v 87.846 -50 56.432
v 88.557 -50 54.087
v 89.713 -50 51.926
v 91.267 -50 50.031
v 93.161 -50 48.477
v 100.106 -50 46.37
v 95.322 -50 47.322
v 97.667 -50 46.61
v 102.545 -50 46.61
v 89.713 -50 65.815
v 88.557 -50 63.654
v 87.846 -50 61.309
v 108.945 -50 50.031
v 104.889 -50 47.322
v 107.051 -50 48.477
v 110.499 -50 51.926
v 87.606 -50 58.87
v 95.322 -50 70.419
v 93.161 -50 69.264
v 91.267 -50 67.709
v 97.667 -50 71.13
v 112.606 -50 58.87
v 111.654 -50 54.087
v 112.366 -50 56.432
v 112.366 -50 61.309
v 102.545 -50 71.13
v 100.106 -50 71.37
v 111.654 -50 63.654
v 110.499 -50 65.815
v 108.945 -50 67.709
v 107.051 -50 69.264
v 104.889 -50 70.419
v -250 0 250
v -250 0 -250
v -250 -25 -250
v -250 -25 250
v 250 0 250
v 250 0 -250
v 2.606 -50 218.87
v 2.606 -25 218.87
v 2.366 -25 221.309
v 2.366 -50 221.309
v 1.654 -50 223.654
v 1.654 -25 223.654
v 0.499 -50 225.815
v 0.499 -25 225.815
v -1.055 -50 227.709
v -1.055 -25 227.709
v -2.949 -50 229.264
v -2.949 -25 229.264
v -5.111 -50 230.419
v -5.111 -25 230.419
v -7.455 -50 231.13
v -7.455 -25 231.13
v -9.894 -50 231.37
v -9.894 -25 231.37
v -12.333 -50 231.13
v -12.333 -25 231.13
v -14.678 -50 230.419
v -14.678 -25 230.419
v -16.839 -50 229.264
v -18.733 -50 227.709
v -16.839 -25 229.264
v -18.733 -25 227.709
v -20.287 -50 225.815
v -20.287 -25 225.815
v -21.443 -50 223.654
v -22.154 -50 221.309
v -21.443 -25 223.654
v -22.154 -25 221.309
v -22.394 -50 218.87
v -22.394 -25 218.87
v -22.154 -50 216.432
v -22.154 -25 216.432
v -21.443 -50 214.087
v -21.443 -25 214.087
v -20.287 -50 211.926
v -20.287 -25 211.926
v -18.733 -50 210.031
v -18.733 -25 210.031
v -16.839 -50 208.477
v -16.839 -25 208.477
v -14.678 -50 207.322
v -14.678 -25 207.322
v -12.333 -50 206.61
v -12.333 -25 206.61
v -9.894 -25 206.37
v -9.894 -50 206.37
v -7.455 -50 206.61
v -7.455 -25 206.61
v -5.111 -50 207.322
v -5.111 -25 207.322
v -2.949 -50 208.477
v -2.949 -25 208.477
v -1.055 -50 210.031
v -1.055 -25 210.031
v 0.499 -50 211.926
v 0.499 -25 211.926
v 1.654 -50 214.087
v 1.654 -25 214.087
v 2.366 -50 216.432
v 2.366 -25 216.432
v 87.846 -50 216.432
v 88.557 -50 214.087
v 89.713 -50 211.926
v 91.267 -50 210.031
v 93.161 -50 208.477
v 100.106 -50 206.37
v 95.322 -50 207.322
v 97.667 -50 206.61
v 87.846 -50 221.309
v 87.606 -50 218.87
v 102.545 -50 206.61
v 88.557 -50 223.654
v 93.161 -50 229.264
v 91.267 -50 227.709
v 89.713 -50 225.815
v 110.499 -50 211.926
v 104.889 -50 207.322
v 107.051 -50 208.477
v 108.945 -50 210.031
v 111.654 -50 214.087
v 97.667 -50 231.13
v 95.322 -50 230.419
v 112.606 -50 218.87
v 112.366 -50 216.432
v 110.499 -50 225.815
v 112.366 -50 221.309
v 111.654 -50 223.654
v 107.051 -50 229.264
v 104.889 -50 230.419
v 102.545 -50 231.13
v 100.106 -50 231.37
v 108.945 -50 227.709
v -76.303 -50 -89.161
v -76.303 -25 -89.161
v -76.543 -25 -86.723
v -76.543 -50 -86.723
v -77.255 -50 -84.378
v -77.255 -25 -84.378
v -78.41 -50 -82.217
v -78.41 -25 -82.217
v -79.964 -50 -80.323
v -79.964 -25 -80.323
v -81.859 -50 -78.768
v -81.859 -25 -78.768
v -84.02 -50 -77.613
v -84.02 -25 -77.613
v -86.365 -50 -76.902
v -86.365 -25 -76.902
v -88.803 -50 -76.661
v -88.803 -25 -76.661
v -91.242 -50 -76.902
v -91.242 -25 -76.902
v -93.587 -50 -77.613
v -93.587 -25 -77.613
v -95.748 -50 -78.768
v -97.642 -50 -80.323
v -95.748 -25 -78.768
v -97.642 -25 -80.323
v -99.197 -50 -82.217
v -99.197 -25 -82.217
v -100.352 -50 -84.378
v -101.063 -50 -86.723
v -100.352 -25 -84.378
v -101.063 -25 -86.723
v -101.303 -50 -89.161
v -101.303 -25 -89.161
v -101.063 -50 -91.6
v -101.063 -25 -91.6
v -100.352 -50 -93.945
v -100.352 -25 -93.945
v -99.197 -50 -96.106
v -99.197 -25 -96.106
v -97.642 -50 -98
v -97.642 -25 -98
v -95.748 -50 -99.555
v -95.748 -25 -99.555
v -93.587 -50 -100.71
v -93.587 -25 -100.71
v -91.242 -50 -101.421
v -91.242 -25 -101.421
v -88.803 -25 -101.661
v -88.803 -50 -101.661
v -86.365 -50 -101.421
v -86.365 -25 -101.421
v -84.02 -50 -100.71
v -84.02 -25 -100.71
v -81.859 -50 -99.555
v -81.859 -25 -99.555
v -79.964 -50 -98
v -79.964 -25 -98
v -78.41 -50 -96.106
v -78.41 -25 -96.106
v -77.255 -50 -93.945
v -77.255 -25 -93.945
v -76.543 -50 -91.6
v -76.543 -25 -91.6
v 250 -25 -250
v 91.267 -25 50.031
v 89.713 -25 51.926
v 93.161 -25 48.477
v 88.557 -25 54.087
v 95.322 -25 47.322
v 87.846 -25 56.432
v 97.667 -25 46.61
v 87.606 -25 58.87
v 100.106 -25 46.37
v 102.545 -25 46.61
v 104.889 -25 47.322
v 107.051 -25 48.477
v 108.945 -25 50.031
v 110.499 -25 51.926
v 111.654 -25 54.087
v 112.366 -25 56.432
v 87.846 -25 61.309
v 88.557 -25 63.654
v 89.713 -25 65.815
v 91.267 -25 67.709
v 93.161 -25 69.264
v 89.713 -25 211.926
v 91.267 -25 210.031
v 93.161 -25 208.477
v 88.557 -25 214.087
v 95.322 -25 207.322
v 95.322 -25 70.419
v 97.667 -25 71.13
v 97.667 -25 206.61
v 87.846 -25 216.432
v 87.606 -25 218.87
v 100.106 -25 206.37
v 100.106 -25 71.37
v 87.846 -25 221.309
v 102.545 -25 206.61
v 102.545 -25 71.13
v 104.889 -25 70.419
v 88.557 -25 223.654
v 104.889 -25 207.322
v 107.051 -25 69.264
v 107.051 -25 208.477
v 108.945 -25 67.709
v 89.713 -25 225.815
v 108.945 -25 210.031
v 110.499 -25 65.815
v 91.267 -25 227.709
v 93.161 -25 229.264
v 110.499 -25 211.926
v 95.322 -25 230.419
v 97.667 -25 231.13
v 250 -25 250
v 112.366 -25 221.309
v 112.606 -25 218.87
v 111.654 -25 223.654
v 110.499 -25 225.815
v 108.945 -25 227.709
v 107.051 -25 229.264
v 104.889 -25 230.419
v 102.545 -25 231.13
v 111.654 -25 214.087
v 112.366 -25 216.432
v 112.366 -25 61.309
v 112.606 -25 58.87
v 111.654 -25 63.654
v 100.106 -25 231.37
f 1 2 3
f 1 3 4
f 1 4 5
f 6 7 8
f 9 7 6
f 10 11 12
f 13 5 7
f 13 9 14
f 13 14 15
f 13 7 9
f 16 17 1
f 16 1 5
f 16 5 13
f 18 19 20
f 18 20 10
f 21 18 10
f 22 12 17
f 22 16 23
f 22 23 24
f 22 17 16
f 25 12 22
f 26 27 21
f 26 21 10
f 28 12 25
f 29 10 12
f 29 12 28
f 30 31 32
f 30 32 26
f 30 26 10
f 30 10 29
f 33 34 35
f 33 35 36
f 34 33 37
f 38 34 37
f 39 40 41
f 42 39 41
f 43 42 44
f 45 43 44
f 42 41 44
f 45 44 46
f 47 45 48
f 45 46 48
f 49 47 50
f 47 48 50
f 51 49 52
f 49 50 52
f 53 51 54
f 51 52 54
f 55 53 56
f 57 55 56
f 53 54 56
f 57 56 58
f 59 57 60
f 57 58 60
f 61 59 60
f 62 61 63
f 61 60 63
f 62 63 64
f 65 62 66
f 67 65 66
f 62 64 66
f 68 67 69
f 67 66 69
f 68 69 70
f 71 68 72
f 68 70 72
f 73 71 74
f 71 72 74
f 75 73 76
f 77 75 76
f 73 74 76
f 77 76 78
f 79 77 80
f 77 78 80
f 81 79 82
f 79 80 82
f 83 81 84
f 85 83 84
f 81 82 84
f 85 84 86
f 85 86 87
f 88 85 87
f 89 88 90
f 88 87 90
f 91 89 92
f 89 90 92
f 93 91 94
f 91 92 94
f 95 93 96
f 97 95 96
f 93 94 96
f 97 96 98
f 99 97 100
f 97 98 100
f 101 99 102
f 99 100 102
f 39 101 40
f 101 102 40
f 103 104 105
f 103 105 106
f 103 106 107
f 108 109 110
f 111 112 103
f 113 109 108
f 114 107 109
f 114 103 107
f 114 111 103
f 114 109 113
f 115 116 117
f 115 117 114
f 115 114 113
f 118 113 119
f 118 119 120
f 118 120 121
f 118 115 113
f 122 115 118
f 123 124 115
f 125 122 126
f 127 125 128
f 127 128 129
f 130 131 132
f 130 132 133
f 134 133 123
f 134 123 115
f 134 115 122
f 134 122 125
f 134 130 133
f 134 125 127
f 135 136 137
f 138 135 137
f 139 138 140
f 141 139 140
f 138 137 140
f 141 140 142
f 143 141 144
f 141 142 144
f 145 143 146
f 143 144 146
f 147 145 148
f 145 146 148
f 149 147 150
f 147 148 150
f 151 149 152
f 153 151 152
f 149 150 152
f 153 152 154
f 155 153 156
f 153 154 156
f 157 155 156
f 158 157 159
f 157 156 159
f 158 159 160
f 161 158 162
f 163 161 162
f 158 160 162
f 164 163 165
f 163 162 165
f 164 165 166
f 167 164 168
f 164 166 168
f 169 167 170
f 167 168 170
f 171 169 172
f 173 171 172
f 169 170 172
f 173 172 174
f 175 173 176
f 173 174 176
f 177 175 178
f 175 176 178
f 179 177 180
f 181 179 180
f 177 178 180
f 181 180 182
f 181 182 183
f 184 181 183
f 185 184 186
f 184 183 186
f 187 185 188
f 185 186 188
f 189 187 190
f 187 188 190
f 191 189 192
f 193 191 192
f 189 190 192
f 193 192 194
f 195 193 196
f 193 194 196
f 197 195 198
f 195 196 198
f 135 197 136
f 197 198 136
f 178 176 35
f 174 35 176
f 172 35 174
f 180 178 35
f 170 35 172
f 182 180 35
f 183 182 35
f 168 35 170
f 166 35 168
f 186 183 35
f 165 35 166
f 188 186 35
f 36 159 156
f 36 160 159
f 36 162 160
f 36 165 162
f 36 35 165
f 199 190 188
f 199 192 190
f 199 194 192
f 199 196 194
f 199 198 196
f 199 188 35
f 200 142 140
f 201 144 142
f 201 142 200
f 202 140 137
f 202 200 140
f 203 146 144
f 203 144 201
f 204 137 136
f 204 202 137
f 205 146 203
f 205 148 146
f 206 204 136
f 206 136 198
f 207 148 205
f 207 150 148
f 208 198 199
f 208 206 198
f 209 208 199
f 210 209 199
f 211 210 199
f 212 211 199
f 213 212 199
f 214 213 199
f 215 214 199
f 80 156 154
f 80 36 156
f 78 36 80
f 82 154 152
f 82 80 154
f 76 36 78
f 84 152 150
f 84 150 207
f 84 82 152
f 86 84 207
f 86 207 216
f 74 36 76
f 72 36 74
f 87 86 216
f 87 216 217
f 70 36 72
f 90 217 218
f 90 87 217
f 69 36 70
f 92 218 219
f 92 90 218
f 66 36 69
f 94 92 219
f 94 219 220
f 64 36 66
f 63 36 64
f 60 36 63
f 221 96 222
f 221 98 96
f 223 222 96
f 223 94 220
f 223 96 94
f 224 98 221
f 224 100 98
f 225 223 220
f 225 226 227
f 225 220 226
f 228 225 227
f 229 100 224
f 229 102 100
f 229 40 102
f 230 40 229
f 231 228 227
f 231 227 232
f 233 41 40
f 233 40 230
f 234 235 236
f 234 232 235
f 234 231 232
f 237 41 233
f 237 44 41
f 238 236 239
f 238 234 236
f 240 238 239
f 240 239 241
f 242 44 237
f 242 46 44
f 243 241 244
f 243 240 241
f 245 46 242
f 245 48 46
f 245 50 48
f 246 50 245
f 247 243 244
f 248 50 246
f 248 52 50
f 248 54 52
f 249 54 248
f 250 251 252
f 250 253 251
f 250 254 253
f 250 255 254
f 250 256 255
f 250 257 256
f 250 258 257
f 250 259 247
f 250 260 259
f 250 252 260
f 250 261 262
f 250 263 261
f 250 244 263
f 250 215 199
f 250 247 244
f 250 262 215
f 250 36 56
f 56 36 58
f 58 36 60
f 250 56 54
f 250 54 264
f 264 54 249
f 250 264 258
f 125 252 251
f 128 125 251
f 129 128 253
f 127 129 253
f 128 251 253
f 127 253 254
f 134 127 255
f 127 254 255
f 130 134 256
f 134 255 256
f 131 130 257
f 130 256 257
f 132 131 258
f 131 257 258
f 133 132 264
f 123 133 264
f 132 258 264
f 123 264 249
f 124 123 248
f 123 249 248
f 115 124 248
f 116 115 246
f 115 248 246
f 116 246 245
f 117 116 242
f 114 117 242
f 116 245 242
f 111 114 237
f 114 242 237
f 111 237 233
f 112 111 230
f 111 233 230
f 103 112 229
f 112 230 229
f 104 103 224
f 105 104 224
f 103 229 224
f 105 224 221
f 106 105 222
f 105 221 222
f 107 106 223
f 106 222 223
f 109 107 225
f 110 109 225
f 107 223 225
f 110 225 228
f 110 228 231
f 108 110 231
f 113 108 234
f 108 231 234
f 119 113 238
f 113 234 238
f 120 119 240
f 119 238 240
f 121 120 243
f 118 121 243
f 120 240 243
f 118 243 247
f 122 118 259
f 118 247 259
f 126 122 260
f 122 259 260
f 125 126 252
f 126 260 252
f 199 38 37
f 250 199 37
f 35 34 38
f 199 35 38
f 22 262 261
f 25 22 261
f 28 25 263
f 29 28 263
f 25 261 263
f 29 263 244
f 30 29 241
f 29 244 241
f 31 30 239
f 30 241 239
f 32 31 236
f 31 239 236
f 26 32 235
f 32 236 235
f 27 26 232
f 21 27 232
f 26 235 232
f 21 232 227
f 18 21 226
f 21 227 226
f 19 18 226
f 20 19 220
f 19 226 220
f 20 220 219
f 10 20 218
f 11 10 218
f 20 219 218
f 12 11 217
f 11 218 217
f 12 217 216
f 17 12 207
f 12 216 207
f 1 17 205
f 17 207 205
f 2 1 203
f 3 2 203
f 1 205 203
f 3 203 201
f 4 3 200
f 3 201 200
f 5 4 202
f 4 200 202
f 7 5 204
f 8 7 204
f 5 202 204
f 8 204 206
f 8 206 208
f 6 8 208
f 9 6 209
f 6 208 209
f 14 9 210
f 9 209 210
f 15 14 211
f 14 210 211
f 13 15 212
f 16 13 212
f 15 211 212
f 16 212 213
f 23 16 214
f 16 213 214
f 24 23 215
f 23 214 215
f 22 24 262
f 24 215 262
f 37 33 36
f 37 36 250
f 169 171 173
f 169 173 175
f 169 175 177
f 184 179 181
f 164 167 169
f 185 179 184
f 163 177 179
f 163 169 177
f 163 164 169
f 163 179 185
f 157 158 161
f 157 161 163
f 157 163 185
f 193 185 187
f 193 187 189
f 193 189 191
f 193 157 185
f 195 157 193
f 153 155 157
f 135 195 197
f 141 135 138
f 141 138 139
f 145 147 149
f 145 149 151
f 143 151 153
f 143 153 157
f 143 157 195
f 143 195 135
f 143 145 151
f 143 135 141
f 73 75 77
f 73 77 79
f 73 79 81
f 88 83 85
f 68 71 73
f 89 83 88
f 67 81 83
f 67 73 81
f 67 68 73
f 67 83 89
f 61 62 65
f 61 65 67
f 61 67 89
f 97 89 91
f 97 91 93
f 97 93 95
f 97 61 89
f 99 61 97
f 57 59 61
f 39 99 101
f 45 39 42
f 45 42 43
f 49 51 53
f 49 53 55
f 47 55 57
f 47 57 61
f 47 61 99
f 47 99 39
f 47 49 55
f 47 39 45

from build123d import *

# Parameters (mm, degrees)
F0_W     = 500
F0_H     = 500
F1_DEPTH = 25
F2_R     = 12.5
F3_DEPTH = 25


with BuildPart() as f1:
    # F0 (on Front) → F1 (new body)
    with BuildSketch(Plane.XZ):
        Rectangle(F0_W, F0_H)
    extrude(amount=F1_DEPTH)

    # F2 (on face) → F3 (join)
    with BuildSketch(Plane.XZ.offset(25)):
        with Locations((-9.894066, 218.870133)):
            Circle(F2_R)
        with Locations((100.105934, 218.870133)):
            Circle(F2_R)
        with Locations((100.105934, 58.870133)):
            Circle(F2_R)
        with Locations((-88.803142, -89.161488)):
            Circle(F2_R)
    extrude(amount=F3_DEPTH)


solid = f1.part
